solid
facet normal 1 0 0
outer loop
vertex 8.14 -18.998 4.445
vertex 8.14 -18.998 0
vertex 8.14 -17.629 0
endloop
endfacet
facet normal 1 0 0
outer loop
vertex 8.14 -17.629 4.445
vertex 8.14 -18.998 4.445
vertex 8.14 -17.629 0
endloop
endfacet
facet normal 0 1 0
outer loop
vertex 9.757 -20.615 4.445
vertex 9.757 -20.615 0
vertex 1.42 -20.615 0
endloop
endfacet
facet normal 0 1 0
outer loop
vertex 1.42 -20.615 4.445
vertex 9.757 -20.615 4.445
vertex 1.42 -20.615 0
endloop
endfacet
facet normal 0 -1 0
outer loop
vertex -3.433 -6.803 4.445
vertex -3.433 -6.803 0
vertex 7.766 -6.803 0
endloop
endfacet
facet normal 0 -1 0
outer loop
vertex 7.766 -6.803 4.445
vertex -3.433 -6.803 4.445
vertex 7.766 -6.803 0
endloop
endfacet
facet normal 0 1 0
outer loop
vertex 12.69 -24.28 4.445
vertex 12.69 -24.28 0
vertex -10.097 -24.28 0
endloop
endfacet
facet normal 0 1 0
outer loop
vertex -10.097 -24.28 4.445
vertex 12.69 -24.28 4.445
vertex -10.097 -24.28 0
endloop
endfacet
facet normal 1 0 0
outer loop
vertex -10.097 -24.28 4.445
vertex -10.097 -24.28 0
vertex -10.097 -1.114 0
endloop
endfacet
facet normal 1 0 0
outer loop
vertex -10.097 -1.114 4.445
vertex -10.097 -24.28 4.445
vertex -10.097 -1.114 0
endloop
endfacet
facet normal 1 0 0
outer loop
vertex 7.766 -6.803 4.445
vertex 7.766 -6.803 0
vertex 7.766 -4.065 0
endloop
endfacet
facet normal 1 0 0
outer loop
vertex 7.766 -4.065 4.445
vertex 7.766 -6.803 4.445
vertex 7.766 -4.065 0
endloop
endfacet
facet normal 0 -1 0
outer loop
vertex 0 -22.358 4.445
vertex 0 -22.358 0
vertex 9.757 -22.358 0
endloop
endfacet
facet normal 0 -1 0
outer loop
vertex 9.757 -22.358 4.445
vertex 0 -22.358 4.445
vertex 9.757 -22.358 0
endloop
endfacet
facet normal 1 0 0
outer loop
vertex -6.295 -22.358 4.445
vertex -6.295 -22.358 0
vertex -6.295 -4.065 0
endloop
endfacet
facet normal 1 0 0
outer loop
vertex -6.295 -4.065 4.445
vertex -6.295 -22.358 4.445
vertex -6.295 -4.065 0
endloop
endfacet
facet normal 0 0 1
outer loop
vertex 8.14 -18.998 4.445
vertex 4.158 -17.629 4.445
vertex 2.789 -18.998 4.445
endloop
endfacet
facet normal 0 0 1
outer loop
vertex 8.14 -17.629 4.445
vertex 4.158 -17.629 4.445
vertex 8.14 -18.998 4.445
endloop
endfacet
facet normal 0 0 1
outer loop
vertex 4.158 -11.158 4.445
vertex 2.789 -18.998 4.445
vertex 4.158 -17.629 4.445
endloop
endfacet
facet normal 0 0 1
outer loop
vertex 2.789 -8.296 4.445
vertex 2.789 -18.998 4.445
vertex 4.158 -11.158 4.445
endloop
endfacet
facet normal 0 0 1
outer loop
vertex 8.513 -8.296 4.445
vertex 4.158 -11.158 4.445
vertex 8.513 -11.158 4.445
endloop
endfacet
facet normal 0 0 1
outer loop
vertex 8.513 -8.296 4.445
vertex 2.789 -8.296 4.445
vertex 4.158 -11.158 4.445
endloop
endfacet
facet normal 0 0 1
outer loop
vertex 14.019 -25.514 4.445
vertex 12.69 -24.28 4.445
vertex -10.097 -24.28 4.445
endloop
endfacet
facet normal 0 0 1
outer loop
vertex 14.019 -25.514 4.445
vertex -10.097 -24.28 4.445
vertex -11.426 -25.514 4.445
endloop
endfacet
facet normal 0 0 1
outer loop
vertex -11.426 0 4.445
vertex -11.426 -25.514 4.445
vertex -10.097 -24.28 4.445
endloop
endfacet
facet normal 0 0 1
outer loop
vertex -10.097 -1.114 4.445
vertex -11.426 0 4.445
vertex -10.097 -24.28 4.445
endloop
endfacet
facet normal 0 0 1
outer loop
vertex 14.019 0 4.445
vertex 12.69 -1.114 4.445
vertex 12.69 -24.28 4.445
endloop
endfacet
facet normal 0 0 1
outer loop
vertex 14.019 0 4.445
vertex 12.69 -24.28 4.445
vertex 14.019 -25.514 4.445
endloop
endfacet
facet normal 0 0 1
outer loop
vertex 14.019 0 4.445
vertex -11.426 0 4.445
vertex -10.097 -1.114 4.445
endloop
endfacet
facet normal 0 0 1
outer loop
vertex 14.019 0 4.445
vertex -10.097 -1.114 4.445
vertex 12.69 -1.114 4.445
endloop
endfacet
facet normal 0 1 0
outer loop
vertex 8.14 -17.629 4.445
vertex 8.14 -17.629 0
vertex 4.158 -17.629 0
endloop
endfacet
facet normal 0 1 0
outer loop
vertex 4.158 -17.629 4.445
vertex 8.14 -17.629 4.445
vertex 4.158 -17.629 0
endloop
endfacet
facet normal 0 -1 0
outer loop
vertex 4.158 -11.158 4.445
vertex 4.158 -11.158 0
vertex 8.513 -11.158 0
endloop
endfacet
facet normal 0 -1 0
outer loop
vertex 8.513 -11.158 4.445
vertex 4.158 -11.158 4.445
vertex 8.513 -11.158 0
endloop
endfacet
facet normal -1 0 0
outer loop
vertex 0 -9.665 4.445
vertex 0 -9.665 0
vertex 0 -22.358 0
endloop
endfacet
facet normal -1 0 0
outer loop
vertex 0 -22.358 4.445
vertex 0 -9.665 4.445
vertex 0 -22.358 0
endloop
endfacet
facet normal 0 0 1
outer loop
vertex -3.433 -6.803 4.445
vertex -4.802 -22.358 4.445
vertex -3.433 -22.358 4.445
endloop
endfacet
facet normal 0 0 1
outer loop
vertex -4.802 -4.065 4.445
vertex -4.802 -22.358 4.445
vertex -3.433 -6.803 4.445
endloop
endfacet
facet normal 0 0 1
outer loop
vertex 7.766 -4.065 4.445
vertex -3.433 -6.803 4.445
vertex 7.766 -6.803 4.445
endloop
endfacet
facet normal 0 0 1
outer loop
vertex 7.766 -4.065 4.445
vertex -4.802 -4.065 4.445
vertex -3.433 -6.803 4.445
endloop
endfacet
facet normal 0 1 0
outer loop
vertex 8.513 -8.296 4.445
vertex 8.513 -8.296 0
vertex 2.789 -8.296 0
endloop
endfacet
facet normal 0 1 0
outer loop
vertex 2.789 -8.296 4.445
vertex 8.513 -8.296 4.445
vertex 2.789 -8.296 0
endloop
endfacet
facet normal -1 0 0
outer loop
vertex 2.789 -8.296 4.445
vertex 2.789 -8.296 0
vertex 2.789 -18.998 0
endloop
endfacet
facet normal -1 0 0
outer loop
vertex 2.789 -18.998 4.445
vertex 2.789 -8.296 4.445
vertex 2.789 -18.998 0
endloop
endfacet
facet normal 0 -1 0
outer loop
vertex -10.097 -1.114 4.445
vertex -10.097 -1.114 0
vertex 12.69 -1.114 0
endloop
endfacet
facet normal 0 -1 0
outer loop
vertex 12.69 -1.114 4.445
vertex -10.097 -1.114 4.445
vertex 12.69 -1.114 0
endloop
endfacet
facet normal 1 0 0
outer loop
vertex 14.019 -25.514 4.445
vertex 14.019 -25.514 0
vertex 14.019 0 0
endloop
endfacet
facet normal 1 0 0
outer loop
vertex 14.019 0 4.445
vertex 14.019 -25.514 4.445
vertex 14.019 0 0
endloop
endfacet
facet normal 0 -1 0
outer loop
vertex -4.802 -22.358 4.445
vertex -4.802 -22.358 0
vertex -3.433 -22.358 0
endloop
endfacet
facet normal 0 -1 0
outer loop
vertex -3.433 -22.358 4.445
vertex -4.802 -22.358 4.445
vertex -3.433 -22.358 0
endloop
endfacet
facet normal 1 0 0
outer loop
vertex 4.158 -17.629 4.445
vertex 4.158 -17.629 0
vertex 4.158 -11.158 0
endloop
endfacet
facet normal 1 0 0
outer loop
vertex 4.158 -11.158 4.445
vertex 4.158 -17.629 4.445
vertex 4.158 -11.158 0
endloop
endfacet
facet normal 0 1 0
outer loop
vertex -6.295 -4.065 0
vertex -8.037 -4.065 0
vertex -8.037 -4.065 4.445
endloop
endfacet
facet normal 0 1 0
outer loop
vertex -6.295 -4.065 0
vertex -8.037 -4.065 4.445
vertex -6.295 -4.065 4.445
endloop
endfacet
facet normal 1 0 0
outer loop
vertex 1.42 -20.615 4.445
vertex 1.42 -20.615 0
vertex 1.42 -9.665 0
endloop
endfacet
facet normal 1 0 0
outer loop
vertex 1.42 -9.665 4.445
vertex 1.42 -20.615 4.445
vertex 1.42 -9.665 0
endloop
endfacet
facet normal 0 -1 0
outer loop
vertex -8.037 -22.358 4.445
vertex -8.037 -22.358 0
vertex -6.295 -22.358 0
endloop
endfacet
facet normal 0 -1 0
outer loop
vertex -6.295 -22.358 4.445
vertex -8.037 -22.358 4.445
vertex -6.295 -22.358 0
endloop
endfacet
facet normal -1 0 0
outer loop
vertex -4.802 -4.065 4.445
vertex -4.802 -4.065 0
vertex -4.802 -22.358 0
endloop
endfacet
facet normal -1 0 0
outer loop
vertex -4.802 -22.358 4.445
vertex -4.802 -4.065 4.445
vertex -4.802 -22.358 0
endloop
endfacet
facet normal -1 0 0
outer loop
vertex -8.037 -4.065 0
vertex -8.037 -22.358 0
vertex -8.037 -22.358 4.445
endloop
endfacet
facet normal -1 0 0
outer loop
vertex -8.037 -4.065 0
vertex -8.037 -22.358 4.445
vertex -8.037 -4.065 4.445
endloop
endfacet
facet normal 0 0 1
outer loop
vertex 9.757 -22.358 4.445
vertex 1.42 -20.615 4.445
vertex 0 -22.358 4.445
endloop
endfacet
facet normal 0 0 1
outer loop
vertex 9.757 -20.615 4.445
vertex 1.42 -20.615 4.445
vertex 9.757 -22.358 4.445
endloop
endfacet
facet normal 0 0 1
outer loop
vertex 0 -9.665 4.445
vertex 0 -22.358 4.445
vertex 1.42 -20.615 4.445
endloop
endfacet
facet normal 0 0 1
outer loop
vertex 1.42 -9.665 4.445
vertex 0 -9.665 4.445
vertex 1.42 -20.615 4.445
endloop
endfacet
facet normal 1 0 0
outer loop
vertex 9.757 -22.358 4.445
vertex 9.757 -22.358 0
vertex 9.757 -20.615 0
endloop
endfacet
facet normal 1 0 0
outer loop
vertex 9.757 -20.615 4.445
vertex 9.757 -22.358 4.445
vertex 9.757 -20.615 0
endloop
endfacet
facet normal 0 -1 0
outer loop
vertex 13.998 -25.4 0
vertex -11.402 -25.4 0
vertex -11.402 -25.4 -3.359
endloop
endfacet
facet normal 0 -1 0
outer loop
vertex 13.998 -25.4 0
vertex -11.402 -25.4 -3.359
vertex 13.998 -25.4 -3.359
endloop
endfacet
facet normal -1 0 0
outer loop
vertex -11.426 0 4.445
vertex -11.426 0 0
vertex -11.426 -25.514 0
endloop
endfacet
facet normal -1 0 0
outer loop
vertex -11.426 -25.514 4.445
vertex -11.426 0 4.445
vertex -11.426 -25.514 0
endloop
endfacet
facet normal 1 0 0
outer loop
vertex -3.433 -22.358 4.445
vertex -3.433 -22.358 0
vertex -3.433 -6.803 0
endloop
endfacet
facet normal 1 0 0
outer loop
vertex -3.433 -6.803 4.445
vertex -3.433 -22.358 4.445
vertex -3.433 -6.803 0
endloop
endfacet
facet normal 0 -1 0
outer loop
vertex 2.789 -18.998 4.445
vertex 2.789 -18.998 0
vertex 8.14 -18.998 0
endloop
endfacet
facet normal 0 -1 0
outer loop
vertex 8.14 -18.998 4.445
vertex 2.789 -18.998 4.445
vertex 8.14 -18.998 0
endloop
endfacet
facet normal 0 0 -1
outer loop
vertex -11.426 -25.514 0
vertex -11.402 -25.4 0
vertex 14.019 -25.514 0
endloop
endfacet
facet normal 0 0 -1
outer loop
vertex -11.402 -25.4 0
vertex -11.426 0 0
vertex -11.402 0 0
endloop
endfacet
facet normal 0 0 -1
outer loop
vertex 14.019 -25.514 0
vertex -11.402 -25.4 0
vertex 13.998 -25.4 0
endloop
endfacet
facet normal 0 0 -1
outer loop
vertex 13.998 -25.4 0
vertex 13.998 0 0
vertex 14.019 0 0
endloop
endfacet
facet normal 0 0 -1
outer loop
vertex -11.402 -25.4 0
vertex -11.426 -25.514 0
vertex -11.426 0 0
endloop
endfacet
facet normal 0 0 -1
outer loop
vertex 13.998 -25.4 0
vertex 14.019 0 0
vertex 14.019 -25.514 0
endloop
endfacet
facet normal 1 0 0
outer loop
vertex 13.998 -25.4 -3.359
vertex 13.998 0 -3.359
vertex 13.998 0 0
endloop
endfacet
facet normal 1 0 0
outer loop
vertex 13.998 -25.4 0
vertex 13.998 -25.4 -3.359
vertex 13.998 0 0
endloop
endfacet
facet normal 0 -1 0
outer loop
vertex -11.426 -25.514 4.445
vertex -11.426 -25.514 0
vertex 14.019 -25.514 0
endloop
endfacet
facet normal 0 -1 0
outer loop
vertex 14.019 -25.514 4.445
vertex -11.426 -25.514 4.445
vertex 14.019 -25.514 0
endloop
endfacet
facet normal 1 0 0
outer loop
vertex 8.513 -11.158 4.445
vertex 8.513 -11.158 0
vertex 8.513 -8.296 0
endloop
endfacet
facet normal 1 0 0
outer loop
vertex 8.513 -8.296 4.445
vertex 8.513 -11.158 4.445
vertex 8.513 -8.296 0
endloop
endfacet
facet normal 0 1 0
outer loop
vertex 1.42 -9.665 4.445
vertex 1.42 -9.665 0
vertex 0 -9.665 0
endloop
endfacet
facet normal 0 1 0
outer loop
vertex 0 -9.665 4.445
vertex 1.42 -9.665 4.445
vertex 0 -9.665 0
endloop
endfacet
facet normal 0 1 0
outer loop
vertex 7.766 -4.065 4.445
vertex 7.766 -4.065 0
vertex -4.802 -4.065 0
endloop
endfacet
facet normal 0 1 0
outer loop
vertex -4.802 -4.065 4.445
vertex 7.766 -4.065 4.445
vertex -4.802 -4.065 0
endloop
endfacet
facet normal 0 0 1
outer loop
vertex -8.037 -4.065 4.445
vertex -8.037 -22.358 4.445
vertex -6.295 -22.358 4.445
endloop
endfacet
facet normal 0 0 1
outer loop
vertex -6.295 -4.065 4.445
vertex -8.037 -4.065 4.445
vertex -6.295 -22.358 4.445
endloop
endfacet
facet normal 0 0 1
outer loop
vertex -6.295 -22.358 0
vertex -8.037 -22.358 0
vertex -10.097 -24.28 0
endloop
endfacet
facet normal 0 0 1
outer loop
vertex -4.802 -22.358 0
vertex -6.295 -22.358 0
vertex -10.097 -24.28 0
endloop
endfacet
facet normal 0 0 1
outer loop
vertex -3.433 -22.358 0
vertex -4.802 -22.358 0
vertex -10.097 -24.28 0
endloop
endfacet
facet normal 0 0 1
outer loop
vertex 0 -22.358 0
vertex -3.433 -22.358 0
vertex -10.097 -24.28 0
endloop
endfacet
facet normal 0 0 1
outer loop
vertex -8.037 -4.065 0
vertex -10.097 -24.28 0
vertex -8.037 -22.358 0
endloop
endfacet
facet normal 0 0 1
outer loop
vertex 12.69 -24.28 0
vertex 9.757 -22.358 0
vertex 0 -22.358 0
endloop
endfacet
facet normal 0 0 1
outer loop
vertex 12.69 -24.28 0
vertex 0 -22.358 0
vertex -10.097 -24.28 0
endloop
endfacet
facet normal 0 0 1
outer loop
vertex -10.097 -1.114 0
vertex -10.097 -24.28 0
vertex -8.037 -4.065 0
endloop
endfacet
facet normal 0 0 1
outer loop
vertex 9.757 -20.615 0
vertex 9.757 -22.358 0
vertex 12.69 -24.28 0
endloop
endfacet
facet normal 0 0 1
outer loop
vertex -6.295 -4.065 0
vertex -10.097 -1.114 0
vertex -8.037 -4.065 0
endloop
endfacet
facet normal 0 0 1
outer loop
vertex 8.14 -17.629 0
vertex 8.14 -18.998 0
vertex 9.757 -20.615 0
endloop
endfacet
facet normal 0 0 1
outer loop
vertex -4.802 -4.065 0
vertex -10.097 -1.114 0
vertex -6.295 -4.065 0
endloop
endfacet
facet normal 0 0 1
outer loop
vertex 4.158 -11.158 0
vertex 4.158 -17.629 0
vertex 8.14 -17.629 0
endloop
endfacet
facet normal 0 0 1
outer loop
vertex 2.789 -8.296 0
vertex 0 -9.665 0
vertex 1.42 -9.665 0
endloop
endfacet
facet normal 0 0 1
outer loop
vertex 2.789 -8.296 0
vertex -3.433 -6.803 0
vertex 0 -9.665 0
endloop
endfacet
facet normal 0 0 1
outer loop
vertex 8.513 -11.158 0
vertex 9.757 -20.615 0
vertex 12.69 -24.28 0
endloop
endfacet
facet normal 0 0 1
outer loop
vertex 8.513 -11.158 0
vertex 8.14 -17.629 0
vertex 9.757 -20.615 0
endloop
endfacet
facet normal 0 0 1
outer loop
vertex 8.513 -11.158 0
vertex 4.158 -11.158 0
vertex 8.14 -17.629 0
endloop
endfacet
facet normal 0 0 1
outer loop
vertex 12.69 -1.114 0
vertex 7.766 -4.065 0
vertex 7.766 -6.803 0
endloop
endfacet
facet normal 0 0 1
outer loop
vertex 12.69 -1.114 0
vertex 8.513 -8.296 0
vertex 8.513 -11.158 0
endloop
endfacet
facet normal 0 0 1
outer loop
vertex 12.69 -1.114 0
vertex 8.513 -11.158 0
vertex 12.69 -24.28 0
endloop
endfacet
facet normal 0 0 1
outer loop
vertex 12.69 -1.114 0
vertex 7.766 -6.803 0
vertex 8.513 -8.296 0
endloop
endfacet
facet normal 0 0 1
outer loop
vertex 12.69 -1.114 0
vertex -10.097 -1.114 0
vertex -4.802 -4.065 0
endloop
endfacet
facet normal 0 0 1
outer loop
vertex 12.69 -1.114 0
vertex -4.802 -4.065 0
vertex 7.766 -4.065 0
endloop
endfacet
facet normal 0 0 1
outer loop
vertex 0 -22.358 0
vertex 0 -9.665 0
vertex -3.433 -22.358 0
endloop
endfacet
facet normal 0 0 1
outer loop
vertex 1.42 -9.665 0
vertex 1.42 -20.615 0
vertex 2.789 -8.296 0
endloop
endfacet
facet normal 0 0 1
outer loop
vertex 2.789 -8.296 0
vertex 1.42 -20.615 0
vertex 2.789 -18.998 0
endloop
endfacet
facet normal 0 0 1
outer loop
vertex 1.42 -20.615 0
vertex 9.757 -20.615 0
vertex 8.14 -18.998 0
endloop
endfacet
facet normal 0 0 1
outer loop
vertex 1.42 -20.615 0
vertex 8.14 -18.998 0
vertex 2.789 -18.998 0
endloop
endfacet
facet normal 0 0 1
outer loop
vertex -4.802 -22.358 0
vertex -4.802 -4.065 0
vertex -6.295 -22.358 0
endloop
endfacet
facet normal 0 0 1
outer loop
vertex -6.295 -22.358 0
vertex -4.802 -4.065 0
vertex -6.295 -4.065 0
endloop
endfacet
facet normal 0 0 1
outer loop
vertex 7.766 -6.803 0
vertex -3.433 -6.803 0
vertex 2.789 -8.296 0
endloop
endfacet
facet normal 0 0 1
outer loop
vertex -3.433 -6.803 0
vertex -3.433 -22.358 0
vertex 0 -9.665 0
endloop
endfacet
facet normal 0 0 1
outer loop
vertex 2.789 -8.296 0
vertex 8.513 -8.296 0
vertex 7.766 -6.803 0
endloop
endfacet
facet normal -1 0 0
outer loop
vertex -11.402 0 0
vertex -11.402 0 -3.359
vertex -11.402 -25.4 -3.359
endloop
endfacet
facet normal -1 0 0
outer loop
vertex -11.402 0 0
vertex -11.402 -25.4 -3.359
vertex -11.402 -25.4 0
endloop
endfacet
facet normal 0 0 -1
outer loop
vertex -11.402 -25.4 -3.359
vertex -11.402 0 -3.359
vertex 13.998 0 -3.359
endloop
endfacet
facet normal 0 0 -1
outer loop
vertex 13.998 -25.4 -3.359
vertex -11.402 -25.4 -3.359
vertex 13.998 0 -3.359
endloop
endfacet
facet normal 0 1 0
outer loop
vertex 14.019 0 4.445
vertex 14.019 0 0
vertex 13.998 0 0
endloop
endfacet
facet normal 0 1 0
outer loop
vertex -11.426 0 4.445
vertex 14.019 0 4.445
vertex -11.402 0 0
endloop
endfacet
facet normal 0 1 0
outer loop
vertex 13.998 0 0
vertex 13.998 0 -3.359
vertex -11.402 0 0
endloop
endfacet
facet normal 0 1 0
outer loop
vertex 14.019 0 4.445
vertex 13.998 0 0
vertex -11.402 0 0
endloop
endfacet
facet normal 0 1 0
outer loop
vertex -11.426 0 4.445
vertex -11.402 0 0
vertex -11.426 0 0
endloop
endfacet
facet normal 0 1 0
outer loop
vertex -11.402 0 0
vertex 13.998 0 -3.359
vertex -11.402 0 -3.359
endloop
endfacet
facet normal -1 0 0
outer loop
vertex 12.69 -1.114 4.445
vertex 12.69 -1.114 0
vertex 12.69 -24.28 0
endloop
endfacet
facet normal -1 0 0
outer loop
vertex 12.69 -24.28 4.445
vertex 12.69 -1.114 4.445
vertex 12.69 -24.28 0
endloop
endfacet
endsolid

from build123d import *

# Parameters (mm, degrees)
F0_W     = 25.4
F0_H     = 3.358979
F1_DEPTH = 25.4
F3_DEPTH = 4.445
F4_W     = 1.742139
F4_H     = 18.292457
F5_DEPTH = 4.445


with BuildPart() as f1:
    # F0 (on Front) → F1 (new body)
    with BuildSketch(Plane.XZ):
        with Locations((1.297712, -1.679489)):
            Rectangle(F0_W, F0_H)
    extrude(amount=F1_DEPTH)

    # F2 (on Top) → F3 (join)
    with BuildSketch(Plane.XY):
        Polygon((-10.09671, -1.113531), (-11.425932, 0), (-11.425932, -25.514245), (-10.09671, -24.279967), align=None)
        Polygon((14.01917, 0), (-11.425932, 0), (-10.09671, -1.113531), (12.689948, -1.113531), align=None)
        Polygon((14.01917, -25.514245), (14.01917, 0), (12.689948, -1.113531), (12.689948, -24.279967), align=None)
        Polygon((-10.09671, -24.279967), (-11.425932, -25.514245), (14.01917, -25.514245), (12.689948, -24.279967), align=None)
    extrude(amount=F3_DEPTH)

    # F4 (on Top) → F5 (join)
    with BuildSketch(Plane.XY):
        with Locations((-7.166284, -13.211324)):
            Rectangle(F4_W, F4_H)
        Polygon((7.766334, -4.065096), (0, -4.065096), (-4.801954, -4.065096), (-4.801954, -22.357553), (-3.433129, -22.357553), (-3.433129, -6.802742), (7.766334, -6.802742), align=None)
        Polygon((1.41997, -9.664828), (0, -9.664828), (0, -22.357553), (9.757349, -22.357553), (9.757349, -20.615416), (1.41997, -20.615416), align=None)
        Polygon((8.512964, -11.15809), (8.512964, -8.296004), (2.788794, -8.296004), (2.788794, -18.997714), (8.139649, -18.997714), (8.139649, -17.628891), (4.157616, -17.628891), (4.157616, -11.15809), align=None)
    extrude(amount=F5_DEPTH)


solid = f1.part
